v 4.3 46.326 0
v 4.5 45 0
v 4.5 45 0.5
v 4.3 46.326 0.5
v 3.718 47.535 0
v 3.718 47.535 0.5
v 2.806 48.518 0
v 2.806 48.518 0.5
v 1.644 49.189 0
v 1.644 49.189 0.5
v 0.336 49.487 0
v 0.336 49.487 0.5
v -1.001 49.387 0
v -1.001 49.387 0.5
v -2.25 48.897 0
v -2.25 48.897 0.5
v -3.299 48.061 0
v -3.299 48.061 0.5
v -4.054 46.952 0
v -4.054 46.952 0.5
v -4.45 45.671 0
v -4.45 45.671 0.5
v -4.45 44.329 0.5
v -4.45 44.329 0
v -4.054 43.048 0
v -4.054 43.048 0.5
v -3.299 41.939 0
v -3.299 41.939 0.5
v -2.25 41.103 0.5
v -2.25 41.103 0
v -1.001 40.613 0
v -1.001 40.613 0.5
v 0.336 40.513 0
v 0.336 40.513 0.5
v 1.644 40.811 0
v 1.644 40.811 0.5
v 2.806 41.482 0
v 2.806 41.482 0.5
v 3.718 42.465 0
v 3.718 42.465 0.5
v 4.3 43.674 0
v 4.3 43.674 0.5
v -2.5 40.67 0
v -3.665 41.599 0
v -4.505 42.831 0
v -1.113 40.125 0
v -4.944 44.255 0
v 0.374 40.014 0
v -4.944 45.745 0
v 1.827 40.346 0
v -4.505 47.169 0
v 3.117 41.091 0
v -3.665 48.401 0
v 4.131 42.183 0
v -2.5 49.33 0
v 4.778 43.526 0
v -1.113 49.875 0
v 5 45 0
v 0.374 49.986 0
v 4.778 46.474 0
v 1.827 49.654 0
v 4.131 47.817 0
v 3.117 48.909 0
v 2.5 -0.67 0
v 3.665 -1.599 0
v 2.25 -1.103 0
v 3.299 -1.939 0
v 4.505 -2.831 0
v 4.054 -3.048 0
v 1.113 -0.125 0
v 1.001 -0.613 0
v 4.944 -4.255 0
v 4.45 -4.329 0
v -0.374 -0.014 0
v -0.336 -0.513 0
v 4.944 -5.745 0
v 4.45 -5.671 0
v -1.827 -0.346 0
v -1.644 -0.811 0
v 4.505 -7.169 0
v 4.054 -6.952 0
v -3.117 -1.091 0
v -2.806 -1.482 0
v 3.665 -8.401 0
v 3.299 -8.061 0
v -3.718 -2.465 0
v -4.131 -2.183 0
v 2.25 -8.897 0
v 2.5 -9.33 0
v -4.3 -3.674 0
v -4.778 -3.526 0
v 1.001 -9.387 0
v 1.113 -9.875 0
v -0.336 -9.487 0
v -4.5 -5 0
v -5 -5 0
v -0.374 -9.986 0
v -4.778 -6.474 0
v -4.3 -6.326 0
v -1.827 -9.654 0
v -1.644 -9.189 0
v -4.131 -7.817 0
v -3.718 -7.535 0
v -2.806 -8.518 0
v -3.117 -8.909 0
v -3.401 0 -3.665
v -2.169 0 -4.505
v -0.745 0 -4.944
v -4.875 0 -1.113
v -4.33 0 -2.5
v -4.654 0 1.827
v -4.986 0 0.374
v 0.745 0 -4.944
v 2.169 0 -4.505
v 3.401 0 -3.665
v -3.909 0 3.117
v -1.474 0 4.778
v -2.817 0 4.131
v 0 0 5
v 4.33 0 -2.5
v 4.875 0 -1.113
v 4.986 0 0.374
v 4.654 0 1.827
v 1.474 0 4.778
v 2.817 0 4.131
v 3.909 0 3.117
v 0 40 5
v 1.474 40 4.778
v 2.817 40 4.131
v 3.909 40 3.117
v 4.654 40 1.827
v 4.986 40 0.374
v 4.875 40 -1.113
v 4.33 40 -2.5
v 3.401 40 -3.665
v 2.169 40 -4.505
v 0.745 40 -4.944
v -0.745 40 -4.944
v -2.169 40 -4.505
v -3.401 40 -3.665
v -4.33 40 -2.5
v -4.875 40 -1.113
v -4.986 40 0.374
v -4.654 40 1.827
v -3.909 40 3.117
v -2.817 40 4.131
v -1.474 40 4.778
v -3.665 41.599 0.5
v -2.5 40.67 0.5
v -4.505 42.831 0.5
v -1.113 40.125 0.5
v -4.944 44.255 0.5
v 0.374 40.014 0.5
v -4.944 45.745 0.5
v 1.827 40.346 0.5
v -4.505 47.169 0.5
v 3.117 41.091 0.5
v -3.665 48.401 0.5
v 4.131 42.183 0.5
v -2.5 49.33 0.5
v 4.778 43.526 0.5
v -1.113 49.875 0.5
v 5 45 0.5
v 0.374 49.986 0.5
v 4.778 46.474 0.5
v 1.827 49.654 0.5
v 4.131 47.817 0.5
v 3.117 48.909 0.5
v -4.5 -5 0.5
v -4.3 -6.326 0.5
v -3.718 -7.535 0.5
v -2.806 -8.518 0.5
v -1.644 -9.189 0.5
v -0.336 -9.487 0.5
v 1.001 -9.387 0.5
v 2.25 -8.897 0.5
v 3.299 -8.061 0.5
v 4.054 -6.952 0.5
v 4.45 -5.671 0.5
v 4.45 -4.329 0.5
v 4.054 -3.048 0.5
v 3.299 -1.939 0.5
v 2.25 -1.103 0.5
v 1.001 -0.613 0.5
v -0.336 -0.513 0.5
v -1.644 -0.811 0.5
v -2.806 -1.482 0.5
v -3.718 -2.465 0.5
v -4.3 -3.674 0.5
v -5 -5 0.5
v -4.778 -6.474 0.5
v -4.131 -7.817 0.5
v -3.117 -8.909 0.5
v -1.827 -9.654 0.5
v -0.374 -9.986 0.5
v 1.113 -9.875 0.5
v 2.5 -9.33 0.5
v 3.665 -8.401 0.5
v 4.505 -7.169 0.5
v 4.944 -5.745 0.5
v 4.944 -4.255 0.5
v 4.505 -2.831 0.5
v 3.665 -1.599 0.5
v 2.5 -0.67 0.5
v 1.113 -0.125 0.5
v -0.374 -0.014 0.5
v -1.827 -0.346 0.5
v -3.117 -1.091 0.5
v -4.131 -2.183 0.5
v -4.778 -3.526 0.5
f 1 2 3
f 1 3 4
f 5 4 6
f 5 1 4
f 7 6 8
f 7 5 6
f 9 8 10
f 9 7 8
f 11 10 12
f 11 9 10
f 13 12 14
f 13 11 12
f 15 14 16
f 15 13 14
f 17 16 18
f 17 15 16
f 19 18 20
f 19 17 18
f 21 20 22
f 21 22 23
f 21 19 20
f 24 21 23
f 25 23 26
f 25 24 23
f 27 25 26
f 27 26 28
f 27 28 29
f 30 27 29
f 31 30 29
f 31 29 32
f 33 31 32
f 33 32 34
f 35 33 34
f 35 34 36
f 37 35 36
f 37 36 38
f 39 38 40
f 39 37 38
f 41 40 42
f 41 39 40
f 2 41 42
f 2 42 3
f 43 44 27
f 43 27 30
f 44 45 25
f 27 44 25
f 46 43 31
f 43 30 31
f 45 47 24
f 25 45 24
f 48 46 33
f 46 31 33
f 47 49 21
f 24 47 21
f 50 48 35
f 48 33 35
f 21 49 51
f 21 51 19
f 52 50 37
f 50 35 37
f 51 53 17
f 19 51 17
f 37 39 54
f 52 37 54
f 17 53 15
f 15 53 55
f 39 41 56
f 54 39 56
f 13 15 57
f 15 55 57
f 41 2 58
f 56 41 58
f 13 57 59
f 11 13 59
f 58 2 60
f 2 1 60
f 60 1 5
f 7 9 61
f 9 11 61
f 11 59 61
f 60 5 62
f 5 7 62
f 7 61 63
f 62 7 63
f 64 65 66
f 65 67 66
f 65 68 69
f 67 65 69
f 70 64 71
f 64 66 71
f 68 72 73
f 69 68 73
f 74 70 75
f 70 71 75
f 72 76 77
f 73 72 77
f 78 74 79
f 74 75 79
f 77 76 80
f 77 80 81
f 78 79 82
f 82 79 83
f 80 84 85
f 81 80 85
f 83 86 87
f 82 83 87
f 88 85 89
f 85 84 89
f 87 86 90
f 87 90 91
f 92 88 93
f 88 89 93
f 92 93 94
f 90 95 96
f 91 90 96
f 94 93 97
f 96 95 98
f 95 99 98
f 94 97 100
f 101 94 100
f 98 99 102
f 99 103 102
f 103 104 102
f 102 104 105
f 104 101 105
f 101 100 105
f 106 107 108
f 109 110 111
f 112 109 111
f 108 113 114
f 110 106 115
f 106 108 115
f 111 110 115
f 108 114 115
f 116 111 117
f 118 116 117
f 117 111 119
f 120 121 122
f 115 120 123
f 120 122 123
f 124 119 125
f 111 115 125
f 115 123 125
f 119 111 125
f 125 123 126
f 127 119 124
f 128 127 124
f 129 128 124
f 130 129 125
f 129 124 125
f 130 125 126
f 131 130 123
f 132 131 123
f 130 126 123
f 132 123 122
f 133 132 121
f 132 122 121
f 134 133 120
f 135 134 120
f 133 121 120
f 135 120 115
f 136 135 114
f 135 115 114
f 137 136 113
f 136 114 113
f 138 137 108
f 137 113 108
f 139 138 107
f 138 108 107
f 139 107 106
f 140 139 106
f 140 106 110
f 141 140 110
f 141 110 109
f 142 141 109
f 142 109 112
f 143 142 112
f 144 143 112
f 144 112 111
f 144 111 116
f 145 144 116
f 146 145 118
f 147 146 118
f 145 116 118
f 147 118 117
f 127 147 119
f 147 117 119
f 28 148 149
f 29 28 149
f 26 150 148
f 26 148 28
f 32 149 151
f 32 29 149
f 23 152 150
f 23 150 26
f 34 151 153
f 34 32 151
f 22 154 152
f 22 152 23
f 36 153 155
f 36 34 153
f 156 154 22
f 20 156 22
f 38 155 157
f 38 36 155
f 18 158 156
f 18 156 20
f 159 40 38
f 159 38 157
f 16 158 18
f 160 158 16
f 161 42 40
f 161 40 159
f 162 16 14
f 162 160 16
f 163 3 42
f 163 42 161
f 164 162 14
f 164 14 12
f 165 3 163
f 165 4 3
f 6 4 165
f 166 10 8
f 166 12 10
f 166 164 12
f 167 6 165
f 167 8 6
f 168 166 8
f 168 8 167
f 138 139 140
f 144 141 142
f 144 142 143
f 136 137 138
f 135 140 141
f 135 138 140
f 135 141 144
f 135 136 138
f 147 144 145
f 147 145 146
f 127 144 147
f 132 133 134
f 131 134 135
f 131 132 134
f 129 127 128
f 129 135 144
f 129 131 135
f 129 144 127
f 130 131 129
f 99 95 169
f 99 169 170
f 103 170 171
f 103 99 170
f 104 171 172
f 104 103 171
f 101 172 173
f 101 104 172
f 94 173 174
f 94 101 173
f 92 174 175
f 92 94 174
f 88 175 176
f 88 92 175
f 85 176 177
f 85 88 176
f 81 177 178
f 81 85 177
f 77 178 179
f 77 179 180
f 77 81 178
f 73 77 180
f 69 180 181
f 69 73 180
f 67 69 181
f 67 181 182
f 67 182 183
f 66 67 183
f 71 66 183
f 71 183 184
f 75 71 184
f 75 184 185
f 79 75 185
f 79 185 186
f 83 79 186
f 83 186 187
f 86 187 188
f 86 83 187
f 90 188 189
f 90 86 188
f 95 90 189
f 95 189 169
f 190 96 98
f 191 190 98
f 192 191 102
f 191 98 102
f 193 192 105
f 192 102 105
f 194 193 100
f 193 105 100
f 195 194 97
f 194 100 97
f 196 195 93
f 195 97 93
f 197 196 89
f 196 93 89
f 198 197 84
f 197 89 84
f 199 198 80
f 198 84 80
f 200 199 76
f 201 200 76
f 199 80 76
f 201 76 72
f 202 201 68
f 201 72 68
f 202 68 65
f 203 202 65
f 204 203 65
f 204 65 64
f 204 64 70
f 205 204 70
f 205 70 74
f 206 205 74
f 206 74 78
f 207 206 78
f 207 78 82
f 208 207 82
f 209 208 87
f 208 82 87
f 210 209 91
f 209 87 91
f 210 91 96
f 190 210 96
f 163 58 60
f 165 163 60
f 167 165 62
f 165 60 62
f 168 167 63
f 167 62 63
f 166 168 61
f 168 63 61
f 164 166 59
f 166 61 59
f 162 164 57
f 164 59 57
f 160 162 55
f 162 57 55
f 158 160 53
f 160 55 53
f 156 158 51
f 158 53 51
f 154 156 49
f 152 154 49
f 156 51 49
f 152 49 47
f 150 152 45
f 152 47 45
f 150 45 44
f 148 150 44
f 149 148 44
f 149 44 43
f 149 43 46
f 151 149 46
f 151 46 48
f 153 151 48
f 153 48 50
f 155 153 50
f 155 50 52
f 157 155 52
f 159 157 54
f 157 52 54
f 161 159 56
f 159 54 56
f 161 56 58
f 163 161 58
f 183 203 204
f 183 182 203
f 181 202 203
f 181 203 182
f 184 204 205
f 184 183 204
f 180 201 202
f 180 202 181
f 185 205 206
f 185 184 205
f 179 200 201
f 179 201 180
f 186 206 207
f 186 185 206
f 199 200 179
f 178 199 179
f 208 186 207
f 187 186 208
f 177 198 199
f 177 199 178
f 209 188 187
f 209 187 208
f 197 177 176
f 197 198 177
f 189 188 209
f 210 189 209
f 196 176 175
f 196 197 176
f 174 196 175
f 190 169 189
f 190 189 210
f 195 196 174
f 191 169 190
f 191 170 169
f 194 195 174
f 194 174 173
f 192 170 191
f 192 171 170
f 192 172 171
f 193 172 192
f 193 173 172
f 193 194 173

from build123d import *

# Parameters (mm, degrees)
SKETCH1_R             = 5
BOSS_EXTRUDE1_DEPTH   = 40
SKETCH3_R             = 5
SKETCH3_R_2           = 4.5
BOSS_EXTRUDE2_DEPTH   = 0.5
BOSS_EXTRUDE2_2_DEPTH = 0.5


with BuildPart() as part:
    # Sketch1 → Boss-Extrude1 (new body)
    with BuildSketch(Plane(origin=(0, 0, 0), x_dir=(1, 0, 0), z_dir=(0, 1, 0))):
        with Locations(Location((0, 0, 0), (0, 0, 270))):
            Circle(SKETCH1_R)
    extrude(amount=BOSS_EXTRUDE1_DEPTH)


with BuildPart() as body_2:
    # Sketch3 → Boss-Extrude2 (new body)
    with BuildSketch(Plane.XY):
        with Locations((0, 45)):
            Circle(SKETCH3_R)
        with Locations((0, 45)):
            Circle(SKETCH3_R_2, mode=Mode.SUBTRACT)
    extrude(amount=BOSS_EXTRUDE2_DEPTH)


with BuildPart() as body_3:
    # Sketch3 → Boss-Extrude2 2 (new body)
    with BuildSketch(Plane.XY):
        with Locations(Location((0, -5, 0), (0, 0, 180))):
            Circle(SKETCH3_R)
        with Locations(Location((0, -5, 0), (0, 0, 180))):
            Circle(SKETCH3_R_2, mode=Mode.SUBTRACT)
    extrude(amount=BOSS_EXTRUDE2_2_DEPTH)


solid = Compound([part.part, body_2.part, body_3.part])
